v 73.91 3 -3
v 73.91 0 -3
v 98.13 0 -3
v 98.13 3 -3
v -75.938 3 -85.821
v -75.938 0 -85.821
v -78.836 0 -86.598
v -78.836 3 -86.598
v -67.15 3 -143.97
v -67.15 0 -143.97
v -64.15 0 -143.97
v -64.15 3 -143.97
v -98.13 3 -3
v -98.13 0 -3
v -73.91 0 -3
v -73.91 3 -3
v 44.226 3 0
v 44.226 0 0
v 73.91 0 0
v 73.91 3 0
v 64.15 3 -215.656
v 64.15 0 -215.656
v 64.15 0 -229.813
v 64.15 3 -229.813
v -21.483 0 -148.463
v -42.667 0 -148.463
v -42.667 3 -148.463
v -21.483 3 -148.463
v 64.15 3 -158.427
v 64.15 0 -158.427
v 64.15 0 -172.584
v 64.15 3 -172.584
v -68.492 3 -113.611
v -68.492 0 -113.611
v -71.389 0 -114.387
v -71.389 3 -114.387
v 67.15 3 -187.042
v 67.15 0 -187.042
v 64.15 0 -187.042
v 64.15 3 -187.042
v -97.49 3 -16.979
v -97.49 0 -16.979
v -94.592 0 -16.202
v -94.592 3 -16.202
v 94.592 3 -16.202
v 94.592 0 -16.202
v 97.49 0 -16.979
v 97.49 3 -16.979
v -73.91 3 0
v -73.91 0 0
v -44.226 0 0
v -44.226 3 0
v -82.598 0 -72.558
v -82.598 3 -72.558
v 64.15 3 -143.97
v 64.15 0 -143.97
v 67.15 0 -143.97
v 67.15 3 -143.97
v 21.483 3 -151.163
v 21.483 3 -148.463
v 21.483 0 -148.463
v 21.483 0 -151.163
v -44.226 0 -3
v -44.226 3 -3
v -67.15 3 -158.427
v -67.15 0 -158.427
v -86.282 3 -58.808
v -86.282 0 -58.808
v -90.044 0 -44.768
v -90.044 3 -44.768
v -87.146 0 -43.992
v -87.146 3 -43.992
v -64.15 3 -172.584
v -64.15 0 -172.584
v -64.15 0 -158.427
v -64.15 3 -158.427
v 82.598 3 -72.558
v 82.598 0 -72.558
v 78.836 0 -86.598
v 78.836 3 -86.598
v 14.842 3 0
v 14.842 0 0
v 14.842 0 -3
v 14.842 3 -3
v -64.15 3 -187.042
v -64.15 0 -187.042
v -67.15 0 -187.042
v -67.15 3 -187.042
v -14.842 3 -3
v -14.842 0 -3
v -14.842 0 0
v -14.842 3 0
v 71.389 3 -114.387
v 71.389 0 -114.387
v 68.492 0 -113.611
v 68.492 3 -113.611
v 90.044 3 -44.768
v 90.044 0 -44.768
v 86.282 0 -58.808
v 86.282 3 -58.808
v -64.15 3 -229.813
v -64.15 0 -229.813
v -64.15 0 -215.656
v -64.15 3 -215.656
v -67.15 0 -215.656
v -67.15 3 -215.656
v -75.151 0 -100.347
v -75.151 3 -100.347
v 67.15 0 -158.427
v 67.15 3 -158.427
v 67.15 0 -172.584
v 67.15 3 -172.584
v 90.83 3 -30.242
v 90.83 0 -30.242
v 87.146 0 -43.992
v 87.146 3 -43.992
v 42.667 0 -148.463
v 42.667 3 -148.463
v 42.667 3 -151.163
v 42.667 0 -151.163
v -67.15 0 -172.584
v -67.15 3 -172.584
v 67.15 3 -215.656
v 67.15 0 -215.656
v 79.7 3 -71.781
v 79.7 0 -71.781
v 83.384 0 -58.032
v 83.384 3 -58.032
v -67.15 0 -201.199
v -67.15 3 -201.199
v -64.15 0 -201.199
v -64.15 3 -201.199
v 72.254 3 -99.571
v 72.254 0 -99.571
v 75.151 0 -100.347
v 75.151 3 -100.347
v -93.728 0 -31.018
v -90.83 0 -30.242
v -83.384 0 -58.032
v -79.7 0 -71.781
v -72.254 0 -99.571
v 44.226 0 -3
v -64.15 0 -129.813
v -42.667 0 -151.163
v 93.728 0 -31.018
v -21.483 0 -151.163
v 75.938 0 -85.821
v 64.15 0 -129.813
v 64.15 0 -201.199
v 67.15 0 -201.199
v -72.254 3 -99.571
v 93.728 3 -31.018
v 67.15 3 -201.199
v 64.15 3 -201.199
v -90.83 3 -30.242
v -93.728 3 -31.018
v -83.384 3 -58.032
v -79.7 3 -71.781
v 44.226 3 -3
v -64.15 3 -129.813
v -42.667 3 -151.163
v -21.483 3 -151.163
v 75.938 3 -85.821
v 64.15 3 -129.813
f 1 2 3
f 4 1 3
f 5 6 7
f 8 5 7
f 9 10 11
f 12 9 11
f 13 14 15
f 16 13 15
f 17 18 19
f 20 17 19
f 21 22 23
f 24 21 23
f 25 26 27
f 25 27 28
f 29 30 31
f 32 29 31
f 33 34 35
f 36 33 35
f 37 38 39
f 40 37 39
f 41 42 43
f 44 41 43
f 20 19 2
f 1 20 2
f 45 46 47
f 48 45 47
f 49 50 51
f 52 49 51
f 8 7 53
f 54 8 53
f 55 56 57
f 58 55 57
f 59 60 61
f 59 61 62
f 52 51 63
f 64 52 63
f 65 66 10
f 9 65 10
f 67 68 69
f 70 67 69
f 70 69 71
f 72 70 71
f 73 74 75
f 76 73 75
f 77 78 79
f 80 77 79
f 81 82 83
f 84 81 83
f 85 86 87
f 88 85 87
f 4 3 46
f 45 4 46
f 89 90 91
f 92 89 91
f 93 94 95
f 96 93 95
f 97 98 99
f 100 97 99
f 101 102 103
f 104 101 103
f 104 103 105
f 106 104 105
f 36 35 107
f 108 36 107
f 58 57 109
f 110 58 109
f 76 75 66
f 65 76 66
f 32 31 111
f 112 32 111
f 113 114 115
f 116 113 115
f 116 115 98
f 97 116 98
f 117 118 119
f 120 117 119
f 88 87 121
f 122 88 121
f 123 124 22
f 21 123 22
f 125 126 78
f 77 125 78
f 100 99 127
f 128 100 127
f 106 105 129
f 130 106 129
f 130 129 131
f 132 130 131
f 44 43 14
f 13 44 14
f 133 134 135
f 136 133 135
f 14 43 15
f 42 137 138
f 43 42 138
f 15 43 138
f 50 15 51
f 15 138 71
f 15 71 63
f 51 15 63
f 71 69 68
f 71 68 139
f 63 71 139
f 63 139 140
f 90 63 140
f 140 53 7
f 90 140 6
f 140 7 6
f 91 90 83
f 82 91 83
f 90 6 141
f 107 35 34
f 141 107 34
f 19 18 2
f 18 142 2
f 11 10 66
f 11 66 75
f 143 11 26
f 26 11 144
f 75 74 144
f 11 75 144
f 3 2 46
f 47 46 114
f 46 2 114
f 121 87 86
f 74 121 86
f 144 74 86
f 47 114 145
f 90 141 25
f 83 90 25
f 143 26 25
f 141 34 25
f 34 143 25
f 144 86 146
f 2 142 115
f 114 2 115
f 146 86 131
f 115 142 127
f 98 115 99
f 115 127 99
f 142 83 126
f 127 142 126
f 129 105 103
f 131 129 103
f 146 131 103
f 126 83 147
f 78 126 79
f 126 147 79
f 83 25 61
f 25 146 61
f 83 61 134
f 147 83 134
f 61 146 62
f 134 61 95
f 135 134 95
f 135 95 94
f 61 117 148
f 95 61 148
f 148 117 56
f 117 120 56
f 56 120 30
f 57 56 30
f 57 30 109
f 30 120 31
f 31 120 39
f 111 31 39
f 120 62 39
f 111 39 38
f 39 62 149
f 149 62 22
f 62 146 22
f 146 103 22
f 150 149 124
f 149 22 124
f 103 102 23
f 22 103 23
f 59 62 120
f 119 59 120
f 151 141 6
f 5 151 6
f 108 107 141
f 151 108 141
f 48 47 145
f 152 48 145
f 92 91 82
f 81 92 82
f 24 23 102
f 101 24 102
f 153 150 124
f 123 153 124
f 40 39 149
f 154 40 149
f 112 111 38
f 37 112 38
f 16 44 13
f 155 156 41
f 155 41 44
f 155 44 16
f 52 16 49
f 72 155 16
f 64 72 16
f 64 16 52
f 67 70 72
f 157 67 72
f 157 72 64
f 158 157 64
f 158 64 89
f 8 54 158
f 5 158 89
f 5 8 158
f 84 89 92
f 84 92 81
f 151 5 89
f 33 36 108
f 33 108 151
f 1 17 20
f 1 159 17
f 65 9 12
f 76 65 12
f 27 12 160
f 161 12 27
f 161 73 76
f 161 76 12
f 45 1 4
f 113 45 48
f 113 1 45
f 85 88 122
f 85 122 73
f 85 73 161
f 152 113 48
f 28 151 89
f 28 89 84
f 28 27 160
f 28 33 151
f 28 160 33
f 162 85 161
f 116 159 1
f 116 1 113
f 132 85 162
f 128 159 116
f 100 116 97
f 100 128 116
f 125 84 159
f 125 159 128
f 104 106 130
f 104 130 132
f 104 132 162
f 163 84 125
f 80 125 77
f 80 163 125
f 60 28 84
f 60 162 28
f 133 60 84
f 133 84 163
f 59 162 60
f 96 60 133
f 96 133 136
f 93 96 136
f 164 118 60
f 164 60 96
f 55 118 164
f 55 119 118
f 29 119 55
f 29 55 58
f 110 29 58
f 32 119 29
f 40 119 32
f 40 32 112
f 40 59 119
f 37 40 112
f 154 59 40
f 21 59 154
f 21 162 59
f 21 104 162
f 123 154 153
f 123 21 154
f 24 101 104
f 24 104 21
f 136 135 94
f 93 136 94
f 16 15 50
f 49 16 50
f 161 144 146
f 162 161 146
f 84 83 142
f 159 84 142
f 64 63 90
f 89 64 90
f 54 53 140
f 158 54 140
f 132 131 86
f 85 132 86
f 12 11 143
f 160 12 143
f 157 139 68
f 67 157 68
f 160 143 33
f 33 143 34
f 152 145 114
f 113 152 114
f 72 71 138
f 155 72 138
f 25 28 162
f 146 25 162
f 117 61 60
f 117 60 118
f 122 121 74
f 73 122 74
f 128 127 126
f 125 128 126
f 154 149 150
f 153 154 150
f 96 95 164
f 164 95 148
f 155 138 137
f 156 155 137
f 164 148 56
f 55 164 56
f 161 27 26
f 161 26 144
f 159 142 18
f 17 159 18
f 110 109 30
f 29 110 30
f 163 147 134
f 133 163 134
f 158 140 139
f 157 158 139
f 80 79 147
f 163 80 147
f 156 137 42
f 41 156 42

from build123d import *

# Parameters (mm, degrees)
SKETCH1_W           = 21.18343152
SKETCH1_H           = 2.7
BOSS_EXTRUDE1_DEPTH = 3


with BuildPart() as part:
    # Sketch1 → Boss-Extrude1 (new body)
    with BuildSketch(Plane(origin=(0, 0, 0), x_dir=(1, 0, 0), z_dir=(0, 1, 0))):
        Polygon((44.226000001, 0), (73.910000001, 0), (73.910000001, 3), (98.12973499, 3), (94.59216997, 16.202372389), (97.489947449, 16.978829524), (93.72803317, 31.018484749), (90.830255691, 30.242027613), (87.145987125, 43.99190509), (90.043764604, 44.768362225), (86.281850324, 58.808017449), (83.384072846, 58.031560314), (79.69980428, 71.781437791), (82.597581759, 72.557894926), (78.835667479, 86.59755015), (75.93789, 85.821093015), (72.253621435, 99.570970491), (75.151398913, 100.347427627), (71.389484634, 114.387082851), (68.491707155, 113.610625716), (64.150294558, 129.812998105), (64.150294558, 143.970140962), (67.150294558, 143.970140962), (67.150294558, 158.427283819), (64.150294558, 158.427283819), (64.150294558, 172.584426676), (67.150294558, 172.584426676), (67.150294558, 187.041569533), (64.150294558, 187.041569533), (64.150294558, 201.19871239), (67.150294558, 201.19871239), (67.150294558, 215.655855248), (64.150294558, 215.655855248), (64.150294558, 229.812998105), (-64.150294558, 229.812998105), (-64.150294558, 215.655855248), (-67.150294558, 215.655855248), (-67.150294558, 201.19871239), (-64.150294558, 201.19871239), (-64.150294558, 187.041569533), (-67.150294558, 187.041569533), (-67.150294558, 172.584426676), (-64.150294558, 172.584426676), (-64.150294558, 158.427283819), (-67.150294558, 158.427283819), (-67.150294558, 143.970140962), (-64.150294558, 143.970140962), (-64.150294558, 129.812998105), (-68.491707155, 113.610625716), (-71.389484634, 114.387082851), (-75.151398913, 100.347427627), (-72.253621435, 99.570970491), (-75.93789, 85.821093015), (-78.835667479, 86.59755015), (-82.597581759, 72.557894926), (-79.69980428, 71.781437791), (-83.384072846, 58.031560314), (-86.281850324, 58.808017449), (-90.043764604, 44.768362225), (-87.145987125, 43.99190509), (-90.830255691, 30.242027613), (-93.72803317, 31.018484749), (-97.489947449, 16.978829524), (-94.59216997, 16.202372389), (-98.12973499, 3), (-73.910000001, 3), (-73.910000001, 0), (-44.226000001, 0), (-44.226000001, 3), (-14.842, 3), (-14.842, 0), (14.842, 0), (14.842, 3), (44.226000001, 3), align=None)
        with Locations((-32.075147279, 149.812998105)):
            Rectangle(SKETCH1_W, SKETCH1_H, mode=Mode.SUBTRACT)
        with Locations((32.075147279, 149.812998105)):
            Rectangle(SKETCH1_W, SKETCH1_H, mode=Mode.SUBTRACT)
    extrude(amount=BOSS_EXTRUDE1_DEPTH)


solid = part.part
